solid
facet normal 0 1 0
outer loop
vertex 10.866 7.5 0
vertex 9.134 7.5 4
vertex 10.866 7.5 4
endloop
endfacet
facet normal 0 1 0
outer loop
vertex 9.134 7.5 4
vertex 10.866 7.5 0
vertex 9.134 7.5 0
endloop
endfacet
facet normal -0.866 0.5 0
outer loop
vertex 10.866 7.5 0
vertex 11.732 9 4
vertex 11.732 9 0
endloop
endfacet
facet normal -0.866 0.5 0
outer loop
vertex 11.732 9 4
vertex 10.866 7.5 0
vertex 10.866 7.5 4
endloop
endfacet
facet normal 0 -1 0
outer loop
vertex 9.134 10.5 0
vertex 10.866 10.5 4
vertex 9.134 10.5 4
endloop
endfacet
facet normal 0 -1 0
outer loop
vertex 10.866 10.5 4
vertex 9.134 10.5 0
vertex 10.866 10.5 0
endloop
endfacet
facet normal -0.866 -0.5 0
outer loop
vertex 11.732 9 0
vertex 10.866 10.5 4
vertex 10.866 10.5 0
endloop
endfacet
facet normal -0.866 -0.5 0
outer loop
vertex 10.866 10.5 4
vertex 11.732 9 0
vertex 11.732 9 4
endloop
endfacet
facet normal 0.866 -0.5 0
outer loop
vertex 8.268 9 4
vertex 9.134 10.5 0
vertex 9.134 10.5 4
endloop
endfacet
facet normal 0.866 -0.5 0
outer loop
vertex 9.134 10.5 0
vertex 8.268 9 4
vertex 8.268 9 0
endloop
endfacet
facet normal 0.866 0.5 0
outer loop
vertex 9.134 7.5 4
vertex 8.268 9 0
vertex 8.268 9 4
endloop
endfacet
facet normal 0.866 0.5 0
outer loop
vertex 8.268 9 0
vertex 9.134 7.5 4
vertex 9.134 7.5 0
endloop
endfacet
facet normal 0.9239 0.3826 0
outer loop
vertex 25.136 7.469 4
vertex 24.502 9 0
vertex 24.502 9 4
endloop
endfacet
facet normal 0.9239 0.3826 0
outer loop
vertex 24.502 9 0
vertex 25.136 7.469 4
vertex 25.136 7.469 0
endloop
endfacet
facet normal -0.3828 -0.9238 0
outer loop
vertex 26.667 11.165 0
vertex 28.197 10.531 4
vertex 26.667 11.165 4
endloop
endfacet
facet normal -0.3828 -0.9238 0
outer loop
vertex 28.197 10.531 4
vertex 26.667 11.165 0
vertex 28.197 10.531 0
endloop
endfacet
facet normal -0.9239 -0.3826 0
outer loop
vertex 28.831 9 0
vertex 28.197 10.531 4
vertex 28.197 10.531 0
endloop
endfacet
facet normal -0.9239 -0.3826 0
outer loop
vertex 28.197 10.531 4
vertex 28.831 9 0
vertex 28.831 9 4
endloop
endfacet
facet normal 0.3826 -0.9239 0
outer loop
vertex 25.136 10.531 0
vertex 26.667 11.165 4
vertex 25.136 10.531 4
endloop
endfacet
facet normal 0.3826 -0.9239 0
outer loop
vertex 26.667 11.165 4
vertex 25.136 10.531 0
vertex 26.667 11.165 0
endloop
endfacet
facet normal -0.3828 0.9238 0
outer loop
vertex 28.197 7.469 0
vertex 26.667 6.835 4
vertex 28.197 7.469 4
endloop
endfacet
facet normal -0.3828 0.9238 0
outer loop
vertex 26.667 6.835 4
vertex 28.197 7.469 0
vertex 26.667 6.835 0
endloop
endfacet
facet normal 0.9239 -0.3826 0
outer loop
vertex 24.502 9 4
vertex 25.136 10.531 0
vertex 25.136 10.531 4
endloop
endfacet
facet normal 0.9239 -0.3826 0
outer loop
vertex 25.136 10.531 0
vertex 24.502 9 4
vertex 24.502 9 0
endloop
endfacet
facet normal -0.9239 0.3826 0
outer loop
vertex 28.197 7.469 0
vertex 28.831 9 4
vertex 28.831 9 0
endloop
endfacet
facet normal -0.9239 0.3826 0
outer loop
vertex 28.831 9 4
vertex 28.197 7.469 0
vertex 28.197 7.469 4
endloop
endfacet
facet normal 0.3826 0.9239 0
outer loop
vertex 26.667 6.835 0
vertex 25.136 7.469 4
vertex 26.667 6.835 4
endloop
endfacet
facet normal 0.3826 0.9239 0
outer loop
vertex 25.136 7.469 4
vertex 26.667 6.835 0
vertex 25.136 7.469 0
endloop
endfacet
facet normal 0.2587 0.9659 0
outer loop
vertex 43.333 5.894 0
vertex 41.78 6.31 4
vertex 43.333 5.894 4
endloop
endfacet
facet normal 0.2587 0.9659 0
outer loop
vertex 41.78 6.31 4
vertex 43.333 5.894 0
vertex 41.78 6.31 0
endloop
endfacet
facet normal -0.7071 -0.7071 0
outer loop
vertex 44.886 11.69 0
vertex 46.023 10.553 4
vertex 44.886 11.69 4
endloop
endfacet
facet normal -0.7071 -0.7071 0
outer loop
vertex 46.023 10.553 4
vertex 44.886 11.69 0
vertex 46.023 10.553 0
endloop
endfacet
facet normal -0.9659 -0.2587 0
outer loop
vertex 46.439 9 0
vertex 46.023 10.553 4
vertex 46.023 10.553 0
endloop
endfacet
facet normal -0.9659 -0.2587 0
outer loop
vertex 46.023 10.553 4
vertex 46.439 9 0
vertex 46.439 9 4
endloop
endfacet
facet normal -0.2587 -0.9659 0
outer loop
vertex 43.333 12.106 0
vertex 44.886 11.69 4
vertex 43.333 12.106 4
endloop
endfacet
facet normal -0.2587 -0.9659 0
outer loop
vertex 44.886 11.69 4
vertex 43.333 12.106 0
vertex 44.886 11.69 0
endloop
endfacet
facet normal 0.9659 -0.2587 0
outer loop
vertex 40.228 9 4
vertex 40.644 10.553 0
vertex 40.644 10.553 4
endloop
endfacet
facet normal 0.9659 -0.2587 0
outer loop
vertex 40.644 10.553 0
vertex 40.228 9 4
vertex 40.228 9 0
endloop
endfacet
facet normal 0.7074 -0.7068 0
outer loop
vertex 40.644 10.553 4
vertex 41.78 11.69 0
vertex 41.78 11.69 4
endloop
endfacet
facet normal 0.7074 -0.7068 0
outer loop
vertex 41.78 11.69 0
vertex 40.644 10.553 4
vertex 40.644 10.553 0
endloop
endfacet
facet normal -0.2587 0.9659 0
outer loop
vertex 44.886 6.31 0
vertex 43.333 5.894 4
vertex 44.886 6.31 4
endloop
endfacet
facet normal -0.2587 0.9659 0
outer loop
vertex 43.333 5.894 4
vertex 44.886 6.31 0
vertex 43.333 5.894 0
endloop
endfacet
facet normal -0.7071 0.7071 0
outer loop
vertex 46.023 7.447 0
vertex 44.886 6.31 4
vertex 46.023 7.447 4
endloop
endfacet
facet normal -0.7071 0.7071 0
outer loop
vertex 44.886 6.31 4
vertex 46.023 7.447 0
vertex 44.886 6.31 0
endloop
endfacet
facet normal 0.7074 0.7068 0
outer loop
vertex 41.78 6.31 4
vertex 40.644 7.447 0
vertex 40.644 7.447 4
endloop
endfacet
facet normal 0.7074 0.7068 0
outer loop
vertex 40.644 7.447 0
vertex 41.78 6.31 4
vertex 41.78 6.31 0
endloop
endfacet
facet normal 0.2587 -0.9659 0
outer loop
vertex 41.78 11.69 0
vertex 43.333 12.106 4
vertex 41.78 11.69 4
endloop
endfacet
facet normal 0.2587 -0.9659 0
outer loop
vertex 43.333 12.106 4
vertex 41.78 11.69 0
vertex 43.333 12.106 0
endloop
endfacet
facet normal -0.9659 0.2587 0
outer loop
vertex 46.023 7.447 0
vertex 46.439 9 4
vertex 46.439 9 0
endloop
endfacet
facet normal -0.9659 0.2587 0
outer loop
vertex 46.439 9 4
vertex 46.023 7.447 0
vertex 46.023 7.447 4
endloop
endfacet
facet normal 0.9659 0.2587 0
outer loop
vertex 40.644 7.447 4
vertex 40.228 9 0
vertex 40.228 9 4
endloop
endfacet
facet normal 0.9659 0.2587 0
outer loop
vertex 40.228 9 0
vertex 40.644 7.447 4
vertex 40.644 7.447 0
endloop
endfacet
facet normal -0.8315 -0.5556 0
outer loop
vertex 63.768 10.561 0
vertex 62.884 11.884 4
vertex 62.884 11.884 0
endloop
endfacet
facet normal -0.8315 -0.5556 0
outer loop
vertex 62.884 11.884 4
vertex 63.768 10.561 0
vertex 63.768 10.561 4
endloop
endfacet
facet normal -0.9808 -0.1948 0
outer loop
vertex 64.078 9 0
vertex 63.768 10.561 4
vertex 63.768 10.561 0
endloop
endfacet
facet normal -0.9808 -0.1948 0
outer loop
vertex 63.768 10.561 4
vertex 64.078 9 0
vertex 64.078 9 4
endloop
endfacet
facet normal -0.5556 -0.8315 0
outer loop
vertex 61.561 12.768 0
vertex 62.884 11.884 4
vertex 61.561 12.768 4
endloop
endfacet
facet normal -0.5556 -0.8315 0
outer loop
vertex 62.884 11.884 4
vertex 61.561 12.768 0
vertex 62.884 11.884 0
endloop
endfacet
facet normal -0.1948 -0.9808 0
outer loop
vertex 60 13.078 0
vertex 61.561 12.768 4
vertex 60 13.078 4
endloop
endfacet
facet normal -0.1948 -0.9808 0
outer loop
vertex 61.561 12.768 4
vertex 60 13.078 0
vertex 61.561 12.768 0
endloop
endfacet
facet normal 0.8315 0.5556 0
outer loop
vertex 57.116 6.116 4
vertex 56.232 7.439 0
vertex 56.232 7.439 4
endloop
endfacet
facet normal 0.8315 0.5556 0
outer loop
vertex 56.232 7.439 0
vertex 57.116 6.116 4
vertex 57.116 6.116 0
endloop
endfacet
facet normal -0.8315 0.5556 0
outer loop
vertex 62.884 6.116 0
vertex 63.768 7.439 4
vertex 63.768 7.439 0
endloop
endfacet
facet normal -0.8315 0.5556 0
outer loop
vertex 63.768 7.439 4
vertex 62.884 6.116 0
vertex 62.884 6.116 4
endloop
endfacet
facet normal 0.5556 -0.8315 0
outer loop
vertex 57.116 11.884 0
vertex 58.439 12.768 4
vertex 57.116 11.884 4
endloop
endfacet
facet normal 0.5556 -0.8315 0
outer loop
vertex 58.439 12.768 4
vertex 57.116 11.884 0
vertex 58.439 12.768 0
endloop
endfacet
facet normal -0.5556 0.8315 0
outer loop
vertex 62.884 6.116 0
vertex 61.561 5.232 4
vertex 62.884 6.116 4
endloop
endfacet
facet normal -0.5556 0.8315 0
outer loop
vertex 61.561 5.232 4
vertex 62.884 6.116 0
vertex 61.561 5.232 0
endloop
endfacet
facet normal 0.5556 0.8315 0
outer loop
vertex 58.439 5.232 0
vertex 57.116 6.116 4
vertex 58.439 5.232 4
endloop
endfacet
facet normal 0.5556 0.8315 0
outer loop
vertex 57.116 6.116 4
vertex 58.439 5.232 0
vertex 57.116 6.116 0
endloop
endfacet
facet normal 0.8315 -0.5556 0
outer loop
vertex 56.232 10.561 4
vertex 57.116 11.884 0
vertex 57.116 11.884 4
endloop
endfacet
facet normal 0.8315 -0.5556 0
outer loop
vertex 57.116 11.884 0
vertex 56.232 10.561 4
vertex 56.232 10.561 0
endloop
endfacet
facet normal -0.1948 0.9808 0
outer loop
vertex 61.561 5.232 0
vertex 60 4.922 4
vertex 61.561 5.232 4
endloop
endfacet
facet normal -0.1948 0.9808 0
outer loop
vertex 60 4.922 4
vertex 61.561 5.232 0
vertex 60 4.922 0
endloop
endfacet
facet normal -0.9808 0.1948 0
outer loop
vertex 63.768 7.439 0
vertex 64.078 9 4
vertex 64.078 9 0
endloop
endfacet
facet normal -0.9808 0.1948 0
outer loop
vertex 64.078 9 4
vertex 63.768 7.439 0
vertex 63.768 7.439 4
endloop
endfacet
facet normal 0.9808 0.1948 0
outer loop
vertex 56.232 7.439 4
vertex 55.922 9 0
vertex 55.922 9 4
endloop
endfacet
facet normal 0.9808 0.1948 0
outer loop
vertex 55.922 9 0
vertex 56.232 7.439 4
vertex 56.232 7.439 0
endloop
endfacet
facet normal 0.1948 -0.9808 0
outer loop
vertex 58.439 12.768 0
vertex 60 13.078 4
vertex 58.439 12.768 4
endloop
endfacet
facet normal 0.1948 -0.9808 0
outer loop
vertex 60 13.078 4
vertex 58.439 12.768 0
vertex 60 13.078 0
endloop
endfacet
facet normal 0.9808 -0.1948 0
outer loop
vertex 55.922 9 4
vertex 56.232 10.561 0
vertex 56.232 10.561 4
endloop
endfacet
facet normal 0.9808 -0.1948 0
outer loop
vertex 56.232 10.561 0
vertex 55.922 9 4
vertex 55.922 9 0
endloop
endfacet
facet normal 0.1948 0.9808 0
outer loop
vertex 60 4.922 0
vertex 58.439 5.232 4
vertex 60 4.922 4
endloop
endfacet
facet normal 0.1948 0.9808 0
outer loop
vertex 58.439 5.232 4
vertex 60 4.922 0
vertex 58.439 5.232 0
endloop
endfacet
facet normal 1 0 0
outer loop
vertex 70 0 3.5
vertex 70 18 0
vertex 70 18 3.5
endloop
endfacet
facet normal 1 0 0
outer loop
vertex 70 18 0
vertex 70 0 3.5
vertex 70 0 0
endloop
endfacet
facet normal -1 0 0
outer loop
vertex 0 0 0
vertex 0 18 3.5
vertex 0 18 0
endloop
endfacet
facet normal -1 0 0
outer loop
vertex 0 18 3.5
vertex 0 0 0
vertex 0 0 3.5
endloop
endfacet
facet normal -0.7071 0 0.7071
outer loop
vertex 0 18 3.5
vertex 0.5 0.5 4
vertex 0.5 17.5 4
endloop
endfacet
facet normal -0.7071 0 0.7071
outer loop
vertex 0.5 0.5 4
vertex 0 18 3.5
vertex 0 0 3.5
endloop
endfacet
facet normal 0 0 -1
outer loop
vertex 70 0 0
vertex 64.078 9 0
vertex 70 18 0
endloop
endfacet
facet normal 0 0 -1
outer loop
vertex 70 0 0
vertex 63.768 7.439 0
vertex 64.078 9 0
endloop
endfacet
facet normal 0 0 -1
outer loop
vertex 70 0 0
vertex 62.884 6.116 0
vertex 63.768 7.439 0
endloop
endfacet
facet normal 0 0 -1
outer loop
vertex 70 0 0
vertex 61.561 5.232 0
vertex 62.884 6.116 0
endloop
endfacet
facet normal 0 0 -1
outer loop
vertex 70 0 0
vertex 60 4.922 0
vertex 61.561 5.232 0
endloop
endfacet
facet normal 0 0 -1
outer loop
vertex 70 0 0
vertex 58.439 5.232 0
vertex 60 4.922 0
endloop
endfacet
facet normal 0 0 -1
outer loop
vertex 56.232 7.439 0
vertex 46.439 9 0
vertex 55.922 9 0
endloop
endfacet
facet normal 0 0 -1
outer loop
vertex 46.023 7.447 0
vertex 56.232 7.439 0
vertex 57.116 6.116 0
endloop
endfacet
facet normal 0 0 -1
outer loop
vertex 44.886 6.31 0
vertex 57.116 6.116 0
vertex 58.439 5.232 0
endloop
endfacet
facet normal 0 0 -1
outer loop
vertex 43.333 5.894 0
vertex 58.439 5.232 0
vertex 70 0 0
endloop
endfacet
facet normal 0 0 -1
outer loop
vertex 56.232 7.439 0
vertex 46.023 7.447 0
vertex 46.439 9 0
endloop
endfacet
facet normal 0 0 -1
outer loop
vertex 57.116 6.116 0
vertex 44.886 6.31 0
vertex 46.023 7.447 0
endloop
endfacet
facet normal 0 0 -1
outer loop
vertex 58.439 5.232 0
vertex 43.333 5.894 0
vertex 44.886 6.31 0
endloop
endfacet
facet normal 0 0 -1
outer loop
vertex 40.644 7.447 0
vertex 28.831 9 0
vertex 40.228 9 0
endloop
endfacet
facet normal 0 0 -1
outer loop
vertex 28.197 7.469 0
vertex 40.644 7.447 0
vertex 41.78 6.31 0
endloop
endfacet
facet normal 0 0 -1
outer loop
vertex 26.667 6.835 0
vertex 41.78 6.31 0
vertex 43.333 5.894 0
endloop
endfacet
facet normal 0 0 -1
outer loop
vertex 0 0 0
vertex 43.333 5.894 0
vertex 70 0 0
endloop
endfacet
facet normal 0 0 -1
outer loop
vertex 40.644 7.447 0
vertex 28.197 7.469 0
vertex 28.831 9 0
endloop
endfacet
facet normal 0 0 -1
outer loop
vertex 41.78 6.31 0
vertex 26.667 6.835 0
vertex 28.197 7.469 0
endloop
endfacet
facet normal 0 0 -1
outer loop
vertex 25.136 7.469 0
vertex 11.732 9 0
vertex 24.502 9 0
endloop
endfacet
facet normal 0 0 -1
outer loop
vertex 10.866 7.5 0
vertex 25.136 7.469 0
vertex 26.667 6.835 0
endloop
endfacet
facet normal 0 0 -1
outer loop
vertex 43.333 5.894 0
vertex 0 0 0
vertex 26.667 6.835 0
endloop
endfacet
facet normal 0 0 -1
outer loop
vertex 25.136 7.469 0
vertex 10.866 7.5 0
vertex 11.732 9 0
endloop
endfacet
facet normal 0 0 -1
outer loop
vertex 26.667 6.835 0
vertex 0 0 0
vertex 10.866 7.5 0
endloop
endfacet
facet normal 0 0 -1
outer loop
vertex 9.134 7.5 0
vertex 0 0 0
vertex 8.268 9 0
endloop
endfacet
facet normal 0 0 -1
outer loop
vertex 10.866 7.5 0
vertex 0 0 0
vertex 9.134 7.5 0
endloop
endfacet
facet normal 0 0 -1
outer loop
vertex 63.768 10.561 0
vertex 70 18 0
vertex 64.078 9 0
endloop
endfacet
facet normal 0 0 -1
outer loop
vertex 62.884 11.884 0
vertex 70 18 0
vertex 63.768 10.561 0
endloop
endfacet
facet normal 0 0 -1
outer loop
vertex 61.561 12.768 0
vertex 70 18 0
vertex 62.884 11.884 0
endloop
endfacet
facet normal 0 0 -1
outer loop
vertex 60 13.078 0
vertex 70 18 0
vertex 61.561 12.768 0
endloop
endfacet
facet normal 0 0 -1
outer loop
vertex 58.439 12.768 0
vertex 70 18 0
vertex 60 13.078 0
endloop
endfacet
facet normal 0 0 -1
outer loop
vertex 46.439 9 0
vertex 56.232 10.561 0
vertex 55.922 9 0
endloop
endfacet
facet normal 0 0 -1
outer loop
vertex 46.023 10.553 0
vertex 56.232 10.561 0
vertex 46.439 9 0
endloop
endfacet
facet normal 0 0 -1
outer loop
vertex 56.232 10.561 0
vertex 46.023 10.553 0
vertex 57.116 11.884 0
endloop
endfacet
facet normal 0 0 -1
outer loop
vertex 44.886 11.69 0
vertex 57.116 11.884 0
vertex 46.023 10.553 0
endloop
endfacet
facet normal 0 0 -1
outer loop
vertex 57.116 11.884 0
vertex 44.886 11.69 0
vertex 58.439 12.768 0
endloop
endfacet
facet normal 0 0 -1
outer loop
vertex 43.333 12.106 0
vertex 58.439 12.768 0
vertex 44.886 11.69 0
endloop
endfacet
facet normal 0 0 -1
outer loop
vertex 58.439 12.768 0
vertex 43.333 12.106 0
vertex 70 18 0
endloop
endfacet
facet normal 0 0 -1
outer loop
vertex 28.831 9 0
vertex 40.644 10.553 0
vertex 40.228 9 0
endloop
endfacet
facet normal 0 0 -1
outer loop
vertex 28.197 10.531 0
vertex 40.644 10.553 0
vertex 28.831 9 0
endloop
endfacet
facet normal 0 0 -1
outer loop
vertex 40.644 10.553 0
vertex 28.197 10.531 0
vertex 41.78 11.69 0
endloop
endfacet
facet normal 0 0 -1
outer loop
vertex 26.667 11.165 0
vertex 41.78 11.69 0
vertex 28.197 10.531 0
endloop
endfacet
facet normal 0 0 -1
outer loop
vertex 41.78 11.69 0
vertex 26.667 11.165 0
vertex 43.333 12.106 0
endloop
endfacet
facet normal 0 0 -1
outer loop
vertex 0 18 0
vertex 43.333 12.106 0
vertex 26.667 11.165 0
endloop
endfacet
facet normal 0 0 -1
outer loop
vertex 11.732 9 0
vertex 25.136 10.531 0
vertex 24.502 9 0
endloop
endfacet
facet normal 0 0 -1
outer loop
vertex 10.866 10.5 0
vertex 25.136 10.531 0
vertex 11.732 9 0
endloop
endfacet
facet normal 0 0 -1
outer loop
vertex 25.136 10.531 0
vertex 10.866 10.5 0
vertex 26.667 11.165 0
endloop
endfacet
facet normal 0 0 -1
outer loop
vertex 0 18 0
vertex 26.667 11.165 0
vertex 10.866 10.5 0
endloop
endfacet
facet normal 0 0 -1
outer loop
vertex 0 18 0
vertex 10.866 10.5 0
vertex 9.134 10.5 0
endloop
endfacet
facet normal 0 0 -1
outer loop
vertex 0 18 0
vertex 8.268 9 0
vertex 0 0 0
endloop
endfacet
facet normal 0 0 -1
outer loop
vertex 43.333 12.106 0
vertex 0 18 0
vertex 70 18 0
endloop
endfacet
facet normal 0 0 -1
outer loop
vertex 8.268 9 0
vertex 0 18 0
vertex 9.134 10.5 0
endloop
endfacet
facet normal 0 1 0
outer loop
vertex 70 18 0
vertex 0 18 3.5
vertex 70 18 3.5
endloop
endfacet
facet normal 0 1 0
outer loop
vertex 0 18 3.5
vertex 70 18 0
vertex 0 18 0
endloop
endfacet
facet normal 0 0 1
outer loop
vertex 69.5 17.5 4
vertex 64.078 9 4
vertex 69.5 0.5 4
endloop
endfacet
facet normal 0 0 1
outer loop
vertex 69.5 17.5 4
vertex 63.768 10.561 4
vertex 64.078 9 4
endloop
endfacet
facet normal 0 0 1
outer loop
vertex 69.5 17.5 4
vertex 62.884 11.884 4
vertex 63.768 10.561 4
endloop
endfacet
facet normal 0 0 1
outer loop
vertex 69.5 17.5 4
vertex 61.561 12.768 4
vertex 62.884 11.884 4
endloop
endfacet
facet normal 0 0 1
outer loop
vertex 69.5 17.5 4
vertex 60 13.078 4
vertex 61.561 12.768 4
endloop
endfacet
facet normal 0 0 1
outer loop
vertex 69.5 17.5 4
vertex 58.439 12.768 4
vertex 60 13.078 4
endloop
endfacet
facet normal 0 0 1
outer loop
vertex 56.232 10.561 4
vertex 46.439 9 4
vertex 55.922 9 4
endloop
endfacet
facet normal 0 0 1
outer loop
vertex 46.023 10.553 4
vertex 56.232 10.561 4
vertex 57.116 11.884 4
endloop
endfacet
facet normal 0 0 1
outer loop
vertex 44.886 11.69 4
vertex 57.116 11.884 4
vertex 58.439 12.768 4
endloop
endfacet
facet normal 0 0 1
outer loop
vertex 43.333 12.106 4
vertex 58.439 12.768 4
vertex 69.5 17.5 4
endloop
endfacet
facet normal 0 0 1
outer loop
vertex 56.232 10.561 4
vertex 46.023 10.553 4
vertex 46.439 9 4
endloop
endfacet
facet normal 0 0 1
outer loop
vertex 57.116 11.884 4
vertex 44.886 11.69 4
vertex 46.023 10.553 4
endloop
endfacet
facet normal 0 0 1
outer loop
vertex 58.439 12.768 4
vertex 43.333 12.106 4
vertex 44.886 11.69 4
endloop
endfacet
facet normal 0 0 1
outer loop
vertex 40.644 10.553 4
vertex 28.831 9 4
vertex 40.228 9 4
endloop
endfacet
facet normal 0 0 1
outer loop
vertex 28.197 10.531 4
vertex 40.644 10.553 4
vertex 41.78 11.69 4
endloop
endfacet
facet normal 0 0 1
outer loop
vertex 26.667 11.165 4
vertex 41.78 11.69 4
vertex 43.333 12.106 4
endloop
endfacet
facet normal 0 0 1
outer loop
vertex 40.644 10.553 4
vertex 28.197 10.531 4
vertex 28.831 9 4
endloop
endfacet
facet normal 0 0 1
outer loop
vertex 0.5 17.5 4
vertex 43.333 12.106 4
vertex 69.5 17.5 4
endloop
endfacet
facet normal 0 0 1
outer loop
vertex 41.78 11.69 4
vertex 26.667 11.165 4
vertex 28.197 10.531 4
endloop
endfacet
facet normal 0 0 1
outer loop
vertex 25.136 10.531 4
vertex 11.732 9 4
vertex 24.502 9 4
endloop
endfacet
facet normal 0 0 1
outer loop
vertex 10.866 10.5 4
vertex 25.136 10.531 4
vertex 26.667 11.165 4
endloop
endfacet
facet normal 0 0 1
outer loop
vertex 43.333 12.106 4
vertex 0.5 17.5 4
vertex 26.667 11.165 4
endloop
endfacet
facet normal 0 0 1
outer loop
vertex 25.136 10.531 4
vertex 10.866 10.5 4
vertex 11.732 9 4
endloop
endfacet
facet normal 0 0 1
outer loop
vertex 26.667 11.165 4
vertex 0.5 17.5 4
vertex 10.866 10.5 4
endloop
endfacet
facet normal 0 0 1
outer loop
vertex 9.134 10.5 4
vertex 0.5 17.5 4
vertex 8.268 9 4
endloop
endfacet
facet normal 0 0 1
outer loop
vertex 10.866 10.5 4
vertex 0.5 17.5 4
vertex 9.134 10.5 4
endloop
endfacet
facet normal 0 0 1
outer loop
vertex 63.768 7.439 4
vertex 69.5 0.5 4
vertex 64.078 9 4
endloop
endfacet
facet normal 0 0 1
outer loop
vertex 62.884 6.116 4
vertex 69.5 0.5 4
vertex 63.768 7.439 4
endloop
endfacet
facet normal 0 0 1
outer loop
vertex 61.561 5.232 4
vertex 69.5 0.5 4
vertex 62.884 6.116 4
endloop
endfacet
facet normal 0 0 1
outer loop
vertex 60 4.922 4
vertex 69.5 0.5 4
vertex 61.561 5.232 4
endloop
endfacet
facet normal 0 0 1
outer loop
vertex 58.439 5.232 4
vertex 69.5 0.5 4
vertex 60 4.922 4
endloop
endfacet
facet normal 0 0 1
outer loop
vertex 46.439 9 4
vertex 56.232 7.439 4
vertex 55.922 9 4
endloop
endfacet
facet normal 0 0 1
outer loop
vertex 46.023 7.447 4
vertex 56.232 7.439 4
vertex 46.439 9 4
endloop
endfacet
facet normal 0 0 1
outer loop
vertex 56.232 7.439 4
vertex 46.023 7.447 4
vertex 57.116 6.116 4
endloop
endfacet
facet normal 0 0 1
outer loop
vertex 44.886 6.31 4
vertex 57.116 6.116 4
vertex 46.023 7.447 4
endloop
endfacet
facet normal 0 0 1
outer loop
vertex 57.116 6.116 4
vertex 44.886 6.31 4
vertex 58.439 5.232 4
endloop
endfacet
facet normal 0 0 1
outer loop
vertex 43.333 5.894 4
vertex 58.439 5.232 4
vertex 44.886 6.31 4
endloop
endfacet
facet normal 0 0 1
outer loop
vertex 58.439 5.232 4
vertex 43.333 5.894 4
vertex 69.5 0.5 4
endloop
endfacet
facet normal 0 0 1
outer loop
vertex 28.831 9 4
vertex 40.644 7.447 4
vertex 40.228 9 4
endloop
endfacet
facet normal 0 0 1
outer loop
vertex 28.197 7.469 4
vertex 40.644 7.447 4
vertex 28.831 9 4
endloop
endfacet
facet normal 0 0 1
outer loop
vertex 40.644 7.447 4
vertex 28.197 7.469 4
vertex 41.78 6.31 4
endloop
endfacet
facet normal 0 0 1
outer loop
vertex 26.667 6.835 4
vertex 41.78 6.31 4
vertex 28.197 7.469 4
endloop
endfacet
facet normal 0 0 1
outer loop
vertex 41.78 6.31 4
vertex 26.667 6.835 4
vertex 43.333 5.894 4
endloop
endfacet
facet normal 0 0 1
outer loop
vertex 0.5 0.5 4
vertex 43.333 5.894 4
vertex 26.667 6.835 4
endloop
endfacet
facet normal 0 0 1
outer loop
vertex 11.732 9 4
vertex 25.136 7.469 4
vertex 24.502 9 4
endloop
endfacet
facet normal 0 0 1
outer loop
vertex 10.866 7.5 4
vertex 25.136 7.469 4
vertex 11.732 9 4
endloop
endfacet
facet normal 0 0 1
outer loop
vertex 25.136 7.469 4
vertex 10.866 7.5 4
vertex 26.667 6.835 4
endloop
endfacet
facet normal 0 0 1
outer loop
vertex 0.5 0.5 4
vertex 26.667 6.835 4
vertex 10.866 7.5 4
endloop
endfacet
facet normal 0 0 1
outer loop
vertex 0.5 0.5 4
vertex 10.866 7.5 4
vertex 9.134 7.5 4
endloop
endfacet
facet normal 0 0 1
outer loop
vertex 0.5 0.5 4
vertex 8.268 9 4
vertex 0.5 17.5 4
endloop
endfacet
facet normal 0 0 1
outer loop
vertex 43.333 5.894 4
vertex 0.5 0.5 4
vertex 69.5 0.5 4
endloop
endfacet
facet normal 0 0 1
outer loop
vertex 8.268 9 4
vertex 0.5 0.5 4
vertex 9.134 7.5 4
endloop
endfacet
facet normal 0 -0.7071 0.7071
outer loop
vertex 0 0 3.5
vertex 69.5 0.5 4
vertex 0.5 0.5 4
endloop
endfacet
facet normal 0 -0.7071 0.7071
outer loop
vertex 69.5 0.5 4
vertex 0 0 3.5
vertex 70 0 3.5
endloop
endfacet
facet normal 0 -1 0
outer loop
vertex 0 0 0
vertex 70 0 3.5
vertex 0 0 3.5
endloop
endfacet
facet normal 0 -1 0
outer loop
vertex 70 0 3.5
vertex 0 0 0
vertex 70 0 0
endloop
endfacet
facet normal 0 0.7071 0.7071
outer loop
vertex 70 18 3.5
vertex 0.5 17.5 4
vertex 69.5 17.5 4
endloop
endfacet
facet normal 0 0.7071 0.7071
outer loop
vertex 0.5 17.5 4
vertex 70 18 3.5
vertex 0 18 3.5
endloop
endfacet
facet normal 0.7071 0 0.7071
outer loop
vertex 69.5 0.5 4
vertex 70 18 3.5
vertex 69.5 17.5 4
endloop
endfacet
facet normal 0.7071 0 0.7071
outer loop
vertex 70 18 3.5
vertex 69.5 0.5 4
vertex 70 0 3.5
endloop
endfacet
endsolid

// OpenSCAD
// Vertical FDM hole (MIT). Inline polyhole into model.scad.
// Circumscribed n-gon so the inscribed circle matches the nominal diameter.
$fa = 4;
$fs = 0.4;

/* [Plate] */

// Plate length along X (mm).
plate_length = 70; // [40:1:120]

// Plate width along Y (mm).
plate_width = 18; // [12:1:40]

// Plate thickness (mm).
thickness = 4; // [2:0.5:8]

/* [Rendering] */

// Mid-tone preview color.
plate_color = "#3D6B7A"; // color

/* [Hidden] */

// Bed-face chamfer (elephant-foot relief).
bed_chamfer = 0.5;

polyhole_gauge();

module polyhole_gauge(
    plate_length = plate_length,
    plate_width = plate_width,
    thickness = thickness,
    plate_color = plate_color,
    bed_chamfer = bed_chamfer
) {
    holes = [3, 4, 6, 8];
    color(plate_color)
    difference() {
        hull() {
            cube([plate_length, plate_width, thickness - bed_chamfer]);
            translate([bed_chamfer, bed_chamfer, 0])
                cube([plate_length - 2 * bed_chamfer, plate_width - 2 * bed_chamfer, thickness]);
        }
        for (i = [0 : len(holes) - 1]) {
            d = holes[i];
            x = 10 + i * (plate_length - 20) / (len(holes) - 1);
            translate([x, plate_width / 2, -0.1])
                polyhole(h = thickness + 0.2, d = d);
        }
    }
}

// --- copy from here (MIT vertical polyhole) ---

function polyhole_sides(d) = max(ceil(d * 2), 3);

// Cutter along +Z. Inscribed circle diameter is d (FDM vertical holes print undersize).
module polyhole(h, d, center = false) {
    n = polyhole_sides(d);
    cylinder(h = h, r = (d / 2) / cos(180 / n), $fn = n, center = center);
}

// --- copy until here ---
